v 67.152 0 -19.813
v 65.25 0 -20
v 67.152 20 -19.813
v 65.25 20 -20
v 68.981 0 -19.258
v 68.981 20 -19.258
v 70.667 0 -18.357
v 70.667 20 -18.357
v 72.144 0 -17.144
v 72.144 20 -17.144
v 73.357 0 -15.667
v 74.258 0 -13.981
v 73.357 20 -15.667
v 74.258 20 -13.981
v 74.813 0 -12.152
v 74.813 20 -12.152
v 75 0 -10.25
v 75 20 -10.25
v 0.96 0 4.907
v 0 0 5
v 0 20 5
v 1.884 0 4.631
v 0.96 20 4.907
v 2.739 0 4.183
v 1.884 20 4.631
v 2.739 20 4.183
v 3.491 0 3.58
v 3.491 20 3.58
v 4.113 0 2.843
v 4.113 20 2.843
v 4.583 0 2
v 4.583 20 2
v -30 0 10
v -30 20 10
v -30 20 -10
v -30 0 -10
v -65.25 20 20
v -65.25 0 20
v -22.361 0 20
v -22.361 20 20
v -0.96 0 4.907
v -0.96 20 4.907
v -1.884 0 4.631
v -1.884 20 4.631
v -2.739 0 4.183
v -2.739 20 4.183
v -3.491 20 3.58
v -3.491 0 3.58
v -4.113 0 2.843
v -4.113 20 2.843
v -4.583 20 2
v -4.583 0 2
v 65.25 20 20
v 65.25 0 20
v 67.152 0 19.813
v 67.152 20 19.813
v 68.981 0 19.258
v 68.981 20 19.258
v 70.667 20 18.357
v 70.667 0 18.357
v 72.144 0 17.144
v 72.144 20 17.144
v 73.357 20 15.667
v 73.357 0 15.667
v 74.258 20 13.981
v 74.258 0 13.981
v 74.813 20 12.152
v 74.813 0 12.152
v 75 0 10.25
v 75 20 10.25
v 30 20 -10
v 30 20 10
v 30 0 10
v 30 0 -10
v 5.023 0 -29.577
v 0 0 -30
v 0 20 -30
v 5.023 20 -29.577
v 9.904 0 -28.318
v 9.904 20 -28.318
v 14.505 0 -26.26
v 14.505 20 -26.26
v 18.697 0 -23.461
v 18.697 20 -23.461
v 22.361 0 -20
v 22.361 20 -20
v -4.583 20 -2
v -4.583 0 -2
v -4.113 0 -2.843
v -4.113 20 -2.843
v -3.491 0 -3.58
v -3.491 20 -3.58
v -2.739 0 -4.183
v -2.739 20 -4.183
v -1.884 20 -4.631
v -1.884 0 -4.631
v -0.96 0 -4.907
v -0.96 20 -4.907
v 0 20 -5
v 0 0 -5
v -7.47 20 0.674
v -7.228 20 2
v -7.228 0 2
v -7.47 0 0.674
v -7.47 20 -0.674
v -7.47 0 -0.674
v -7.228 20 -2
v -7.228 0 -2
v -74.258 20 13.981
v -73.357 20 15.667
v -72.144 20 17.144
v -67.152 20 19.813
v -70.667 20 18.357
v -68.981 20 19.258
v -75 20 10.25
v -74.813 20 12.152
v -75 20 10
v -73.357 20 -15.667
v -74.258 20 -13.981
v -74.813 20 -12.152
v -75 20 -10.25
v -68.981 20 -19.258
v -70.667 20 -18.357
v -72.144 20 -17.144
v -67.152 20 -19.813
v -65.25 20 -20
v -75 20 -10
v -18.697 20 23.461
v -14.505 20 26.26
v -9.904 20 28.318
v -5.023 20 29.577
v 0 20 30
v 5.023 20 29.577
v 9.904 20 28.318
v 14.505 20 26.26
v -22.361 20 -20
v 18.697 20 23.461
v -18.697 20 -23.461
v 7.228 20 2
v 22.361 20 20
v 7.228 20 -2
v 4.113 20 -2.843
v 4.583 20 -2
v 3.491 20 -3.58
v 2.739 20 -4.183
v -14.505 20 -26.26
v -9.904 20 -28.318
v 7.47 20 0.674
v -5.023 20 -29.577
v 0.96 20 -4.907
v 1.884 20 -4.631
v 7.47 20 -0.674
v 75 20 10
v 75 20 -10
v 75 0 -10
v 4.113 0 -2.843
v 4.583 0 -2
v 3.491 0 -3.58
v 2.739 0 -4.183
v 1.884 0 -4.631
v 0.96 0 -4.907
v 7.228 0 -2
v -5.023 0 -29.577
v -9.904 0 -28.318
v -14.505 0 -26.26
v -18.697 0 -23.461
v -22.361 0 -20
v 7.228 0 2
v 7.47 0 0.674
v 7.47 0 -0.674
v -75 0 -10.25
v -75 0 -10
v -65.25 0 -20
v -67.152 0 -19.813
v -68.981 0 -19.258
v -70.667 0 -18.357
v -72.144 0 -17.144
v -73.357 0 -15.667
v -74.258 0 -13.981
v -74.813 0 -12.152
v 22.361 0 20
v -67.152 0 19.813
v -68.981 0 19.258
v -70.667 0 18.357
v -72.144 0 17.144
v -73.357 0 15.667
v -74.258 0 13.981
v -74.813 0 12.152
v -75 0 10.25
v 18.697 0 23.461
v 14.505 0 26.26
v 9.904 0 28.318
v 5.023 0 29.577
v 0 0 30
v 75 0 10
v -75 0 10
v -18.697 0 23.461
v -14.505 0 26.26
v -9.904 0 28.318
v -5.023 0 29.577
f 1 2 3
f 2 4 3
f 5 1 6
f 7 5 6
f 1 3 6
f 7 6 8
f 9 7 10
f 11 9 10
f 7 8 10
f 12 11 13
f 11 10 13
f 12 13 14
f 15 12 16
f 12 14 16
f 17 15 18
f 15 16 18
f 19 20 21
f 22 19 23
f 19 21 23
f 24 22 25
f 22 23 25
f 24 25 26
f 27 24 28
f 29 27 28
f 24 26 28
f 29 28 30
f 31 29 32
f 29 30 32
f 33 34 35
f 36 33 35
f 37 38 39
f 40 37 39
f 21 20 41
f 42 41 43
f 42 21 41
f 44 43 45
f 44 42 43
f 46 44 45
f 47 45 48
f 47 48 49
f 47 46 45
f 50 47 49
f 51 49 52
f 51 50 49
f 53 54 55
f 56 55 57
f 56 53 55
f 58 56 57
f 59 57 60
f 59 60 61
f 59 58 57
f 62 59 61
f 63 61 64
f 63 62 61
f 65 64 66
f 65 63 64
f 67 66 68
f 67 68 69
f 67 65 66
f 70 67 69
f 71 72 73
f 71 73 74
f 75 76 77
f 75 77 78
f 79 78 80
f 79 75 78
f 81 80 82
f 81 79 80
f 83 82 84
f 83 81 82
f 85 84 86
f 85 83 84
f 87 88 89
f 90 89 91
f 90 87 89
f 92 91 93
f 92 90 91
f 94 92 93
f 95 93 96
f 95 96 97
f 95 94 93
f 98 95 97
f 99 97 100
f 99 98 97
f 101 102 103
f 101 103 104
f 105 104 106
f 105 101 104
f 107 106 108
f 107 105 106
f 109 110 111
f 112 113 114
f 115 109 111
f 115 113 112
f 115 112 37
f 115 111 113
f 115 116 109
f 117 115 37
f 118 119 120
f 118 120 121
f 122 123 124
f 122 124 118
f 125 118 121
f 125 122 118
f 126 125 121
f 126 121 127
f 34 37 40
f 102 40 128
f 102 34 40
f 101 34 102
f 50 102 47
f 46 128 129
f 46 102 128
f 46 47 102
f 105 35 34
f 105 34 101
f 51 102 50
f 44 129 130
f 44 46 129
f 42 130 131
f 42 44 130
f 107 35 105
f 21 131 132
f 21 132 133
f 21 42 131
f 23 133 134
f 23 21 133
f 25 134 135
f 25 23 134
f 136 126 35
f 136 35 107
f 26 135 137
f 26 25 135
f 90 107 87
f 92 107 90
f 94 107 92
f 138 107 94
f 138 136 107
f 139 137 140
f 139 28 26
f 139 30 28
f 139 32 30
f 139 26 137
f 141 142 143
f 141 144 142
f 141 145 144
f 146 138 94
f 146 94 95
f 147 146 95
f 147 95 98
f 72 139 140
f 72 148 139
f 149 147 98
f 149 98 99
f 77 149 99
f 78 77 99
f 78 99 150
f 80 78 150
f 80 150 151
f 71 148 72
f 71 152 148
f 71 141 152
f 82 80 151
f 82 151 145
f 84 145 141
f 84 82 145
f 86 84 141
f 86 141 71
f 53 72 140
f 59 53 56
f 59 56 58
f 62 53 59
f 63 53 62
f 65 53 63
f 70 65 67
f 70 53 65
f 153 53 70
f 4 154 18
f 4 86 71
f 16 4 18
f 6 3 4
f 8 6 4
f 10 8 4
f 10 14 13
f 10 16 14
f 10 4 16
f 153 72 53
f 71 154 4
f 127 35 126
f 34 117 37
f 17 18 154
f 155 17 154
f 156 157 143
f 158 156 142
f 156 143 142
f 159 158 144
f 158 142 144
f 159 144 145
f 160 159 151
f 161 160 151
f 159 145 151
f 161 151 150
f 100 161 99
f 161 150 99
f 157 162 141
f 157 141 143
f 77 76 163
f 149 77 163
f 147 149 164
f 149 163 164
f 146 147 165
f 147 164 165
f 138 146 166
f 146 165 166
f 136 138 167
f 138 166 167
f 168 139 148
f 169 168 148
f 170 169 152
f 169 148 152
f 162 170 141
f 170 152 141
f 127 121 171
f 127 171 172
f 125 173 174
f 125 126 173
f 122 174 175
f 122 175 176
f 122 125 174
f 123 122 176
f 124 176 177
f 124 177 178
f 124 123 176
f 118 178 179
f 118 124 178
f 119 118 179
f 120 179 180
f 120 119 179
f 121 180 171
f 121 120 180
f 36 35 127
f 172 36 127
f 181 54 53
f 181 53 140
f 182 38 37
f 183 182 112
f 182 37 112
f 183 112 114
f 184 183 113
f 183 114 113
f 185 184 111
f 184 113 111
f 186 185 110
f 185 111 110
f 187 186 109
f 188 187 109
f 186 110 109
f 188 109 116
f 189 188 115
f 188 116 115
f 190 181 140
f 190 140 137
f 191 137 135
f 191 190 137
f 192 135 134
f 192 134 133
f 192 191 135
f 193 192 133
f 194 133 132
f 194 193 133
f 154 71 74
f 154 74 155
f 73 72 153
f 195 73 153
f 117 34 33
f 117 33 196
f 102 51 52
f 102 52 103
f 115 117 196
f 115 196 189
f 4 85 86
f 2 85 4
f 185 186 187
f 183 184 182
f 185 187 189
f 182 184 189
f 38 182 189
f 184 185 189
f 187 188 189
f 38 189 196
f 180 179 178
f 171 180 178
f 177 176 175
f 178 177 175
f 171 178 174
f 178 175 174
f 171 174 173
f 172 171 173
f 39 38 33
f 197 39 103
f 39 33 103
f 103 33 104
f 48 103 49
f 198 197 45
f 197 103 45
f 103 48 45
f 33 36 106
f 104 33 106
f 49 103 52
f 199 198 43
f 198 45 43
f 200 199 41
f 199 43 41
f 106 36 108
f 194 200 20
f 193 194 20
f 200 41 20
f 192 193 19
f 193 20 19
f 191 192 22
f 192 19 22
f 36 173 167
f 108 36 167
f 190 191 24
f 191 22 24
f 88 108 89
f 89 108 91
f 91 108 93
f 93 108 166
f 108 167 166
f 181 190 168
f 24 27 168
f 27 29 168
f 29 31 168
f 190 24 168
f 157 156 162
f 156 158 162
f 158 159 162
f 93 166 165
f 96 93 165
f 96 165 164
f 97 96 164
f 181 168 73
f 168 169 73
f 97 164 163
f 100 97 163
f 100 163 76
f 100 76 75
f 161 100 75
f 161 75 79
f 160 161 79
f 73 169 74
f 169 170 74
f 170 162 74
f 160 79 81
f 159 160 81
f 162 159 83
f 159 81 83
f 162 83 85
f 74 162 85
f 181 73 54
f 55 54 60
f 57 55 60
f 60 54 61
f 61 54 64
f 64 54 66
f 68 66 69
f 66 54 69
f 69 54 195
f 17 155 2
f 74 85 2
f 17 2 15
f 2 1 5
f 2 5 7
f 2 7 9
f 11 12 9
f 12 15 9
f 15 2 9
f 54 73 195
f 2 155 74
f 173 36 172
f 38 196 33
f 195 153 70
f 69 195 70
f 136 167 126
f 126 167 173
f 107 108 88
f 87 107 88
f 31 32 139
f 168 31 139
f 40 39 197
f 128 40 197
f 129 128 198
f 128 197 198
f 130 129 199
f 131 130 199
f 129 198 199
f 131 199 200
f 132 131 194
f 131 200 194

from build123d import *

# Parameters (mm, degrees)
BOSS_EXTRUDE1_DEPTH  = 20
SKETCH2_W            = 45
SKETCH2_H            = 20
CUT_EXTRUDE1_DEPTH   = 20
FILLET1_R            = 9.75
FILLET1_OF_MIRROR4_R = 9.75


with BuildPart() as part:
    # Sketch1 → Boss-Extrude1 (new body)
    with BuildSketch(Plane(origin=(0, 0, 0), x_dir=(1, 0, 0), z_dir=(0, 1, 0))):
        with BuildLine():
            Line((22.360679775, 20), (75, 20))
            Line((75, 20), (75, -20))
            Line((75, -20), (22.360679775, -20))
            ThreePointArc((22.360679775, -20), (12.247448714, -27.386127875), (0, -30))
            Line((0, -30), (0, -20))
            Line((0, -20), (0, 20))
            Line((0, 20), (0, 30))
            ThreePointArc((0, 30), (12.247448714, 27.386127875), (22.360679775, 20))
        make_face()
    boss_extrude1 = extrude(amount=BOSS_EXTRUDE1_DEPTH)

    # Sketch2 → Cut-Extrude1 (cut)
    with BuildSketch(Plane(origin=(0, 20, 0), x_dir=(1, 0, 0), z_dir=(0, 1, 0))):
        with BuildLine():
            Line((0, 5), (0, -5))
            ThreePointArc((0, -5), (2.738612788, -4.183300133), (4.582575695, -2))
            Line((4.582575695, -2), (7.228416147, -2))
            ThreePointArc((7.228416147, -2), (7.5, 0), (7.228416147, 2))
            Line((7.228416147, 2), (4.582575695, 2))
            ThreePointArc((4.582575695, 2), (2.738612788, 4.183300133), (0, 5))
        make_face()
        with Locations((52.5, 0)):
            Rectangle(SKETCH2_W, SKETCH2_H)
    cut_extrude1 = extrude(amount=-CUT_EXTRUDE1_DEPTH, mode=Mode.SUBTRACT)

    # Fillet1
    fillet1_edges = [part.edges().sort_by_distance(p)[0] for p in [
        (75, 10, -20),
        (75, 10, 20),
    ]]
    fillet(fillet1_edges, radius=FILLET1_R)

    # Mirror4: Boss-Extrude1, Cut-Extrude1 across plane
    add(boss_extrude1.mirror(Plane(origin=(0, 0, 0), x_dir=(0, 0, 1), z_dir=(1, 0, 0))))
    add(cut_extrude1.mirror(Plane(origin=(0, 0, 0), x_dir=(0, 0, 1), z_dir=(1, 0, 0))), mode=Mode.SUBTRACT)

    # Fillet1 of Mirror4
    fillet1_of_mirror4_edges = [part.edges().sort_by_distance(p)[0] for p in [
        (-75, 10, -20),
        (-75, 10, 20),
    ]]
    fillet(fillet1_of_mirror4_edges, radius=FILLET1_OF_MIRROR4_R)


solid = part.part
